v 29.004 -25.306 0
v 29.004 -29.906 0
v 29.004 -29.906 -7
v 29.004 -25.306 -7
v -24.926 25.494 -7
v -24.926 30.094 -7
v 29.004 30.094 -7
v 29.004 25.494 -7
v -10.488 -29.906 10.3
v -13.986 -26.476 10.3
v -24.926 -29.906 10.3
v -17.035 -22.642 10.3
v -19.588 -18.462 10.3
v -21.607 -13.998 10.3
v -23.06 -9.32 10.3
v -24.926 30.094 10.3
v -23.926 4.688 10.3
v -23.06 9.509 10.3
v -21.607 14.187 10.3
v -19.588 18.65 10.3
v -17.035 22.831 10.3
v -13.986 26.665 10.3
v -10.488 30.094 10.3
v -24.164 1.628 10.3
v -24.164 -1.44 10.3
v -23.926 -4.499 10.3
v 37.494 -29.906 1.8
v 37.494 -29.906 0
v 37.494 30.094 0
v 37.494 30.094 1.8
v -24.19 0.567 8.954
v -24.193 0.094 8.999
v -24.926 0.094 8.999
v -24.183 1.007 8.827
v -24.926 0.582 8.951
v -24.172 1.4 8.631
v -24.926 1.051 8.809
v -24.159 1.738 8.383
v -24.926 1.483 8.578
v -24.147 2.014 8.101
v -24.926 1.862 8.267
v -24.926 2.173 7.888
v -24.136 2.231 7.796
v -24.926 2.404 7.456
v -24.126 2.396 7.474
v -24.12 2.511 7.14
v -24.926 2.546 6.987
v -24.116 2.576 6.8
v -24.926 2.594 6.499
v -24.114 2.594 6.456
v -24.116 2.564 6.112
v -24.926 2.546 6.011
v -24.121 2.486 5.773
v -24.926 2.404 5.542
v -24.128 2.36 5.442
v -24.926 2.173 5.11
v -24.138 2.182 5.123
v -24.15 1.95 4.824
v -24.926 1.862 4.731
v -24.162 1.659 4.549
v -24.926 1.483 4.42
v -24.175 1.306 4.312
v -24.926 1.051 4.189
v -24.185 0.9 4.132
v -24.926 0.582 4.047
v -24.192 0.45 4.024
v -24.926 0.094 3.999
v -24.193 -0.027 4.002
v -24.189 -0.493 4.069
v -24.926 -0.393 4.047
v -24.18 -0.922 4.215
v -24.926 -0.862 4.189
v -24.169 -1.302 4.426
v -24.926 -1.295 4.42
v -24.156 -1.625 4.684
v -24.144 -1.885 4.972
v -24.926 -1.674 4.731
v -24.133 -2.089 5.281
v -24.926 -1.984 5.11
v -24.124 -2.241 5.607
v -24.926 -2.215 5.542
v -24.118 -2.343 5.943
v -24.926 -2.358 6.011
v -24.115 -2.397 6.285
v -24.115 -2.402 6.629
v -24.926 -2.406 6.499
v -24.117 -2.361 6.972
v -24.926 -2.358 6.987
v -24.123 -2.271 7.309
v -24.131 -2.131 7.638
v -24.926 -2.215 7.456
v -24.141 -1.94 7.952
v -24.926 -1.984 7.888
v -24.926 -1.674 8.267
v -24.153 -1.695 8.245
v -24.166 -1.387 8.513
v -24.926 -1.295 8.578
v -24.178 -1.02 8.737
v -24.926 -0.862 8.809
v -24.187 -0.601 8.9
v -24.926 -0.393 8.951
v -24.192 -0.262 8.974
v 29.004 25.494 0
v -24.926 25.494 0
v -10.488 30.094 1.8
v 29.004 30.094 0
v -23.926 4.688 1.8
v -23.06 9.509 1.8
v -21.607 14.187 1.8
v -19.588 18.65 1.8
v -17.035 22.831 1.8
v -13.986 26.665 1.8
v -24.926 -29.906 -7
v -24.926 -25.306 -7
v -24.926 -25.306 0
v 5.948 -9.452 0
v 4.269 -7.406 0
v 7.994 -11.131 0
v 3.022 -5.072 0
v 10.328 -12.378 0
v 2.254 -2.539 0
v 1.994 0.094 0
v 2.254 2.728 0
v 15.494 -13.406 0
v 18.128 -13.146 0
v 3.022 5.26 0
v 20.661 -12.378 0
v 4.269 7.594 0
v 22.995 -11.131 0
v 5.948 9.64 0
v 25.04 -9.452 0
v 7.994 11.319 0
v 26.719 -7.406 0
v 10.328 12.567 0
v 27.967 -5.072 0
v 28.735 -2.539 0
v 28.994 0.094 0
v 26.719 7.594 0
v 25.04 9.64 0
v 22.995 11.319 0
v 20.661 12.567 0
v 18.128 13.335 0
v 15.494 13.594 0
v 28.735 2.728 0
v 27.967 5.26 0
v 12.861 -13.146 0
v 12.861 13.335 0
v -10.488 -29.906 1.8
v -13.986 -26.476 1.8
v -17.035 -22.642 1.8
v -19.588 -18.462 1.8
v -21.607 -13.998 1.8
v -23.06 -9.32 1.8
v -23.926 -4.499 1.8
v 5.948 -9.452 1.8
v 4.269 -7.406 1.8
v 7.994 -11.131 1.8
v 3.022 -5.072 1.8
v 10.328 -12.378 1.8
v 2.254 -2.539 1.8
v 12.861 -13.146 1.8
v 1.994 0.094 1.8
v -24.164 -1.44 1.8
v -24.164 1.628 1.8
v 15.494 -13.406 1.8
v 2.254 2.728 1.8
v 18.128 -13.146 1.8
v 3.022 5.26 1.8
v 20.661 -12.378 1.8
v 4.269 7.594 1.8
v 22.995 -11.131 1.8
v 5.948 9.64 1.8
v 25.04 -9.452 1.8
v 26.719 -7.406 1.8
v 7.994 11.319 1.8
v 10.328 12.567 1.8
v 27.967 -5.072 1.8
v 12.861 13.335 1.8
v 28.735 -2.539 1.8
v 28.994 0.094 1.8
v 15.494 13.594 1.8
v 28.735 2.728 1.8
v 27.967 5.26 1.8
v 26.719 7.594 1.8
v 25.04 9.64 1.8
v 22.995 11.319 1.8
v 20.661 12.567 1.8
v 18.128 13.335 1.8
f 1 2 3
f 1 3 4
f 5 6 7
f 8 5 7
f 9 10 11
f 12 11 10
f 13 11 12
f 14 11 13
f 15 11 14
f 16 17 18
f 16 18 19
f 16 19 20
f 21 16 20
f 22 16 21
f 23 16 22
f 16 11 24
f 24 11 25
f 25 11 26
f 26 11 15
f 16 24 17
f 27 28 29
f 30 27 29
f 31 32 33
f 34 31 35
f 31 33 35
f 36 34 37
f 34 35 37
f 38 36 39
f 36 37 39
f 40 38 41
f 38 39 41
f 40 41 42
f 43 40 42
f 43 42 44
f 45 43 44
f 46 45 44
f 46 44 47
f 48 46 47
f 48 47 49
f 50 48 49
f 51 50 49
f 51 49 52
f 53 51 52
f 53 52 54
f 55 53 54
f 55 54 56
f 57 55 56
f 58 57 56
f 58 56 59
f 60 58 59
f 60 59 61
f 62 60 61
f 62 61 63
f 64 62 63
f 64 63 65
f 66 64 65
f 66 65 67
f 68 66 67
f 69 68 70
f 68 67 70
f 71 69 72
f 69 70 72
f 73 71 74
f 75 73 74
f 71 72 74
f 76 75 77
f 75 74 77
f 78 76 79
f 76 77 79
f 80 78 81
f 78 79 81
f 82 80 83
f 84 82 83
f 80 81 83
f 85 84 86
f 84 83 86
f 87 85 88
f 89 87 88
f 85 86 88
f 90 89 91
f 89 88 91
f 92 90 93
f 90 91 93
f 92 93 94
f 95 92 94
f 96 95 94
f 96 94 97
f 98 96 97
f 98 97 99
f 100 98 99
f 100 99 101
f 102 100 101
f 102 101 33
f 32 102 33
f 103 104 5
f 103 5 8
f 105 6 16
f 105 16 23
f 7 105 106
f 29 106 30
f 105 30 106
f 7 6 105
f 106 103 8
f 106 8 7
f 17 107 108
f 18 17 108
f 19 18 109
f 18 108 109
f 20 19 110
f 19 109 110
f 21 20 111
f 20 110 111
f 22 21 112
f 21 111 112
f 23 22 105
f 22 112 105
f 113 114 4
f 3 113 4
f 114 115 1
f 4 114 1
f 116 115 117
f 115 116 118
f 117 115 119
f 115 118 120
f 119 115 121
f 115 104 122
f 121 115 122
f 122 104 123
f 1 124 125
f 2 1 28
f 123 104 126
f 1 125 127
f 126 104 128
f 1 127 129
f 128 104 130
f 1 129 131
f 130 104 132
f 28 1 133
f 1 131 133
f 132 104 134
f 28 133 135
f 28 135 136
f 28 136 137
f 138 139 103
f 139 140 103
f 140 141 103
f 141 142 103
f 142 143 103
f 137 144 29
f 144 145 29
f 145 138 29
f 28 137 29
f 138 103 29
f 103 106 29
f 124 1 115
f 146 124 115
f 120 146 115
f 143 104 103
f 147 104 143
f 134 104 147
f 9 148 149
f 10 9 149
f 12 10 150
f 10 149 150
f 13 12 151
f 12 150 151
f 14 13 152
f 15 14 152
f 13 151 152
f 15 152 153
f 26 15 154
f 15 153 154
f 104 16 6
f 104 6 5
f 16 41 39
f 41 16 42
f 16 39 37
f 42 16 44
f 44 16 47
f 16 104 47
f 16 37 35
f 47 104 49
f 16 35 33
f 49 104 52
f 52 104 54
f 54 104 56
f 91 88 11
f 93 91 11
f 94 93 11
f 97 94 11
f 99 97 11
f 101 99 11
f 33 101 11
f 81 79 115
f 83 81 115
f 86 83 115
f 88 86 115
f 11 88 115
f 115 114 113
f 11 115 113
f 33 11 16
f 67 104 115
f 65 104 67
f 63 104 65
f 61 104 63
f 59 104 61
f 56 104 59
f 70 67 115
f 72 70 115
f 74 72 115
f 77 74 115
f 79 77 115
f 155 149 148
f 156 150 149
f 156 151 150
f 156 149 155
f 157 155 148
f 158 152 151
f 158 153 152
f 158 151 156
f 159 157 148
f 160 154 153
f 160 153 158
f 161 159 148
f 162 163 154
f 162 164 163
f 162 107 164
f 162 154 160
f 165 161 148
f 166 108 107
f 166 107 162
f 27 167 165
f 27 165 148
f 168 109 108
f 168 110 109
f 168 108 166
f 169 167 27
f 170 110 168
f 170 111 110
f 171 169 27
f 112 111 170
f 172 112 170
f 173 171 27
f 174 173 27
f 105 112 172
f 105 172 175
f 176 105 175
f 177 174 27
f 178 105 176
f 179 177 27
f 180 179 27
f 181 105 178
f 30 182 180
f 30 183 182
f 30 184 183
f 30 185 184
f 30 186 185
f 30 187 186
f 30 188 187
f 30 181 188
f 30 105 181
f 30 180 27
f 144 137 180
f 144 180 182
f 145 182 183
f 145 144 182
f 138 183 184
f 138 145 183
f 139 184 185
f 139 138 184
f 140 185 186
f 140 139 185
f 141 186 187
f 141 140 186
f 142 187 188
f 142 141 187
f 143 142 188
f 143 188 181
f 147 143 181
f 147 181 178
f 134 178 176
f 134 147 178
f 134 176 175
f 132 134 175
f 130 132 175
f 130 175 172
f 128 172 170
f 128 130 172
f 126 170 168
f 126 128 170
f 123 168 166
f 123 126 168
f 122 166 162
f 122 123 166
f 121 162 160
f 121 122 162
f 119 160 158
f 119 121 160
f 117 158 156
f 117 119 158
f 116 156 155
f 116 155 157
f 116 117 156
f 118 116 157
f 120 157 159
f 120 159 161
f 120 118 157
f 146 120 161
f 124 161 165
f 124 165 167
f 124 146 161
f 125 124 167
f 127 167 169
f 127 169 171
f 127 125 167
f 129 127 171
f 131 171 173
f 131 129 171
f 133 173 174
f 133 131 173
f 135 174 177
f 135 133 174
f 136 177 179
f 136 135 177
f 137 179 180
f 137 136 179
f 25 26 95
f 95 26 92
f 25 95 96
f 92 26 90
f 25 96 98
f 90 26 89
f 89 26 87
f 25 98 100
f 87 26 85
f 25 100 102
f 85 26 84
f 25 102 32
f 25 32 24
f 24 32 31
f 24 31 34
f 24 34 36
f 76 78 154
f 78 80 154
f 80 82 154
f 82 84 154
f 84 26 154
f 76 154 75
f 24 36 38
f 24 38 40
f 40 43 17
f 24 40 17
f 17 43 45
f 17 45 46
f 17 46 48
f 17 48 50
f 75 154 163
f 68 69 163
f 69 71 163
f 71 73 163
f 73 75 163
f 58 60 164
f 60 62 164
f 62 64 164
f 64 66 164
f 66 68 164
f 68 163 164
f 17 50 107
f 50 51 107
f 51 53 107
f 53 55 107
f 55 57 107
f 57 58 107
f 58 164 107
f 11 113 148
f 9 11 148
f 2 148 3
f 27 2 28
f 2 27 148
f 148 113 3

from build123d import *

# Parameters (mm, degrees)
SKETCH1_W               = 62.4208
SKETCH1_H               = 60
SKETCH1_R               = 13.5
BOSS_EXTRUDE1_DEPTH     = 1.8
BOSS_EXTRUDE2_START     = -1.8
SKETCH2_W               = 53.9308
SKETCH2_H               = 4.6
BOSS_EXTRUDE2_DEPTH     = 7
BOSS_EXTRUDE3_DEPTH     = 8.5
CUT_EXTRUDE1_REACH      = 72.058
CUT_EXTRUDE1_END_RADIUS = 39.6875
SKETCH4_R               = 2.5


with BuildPart() as part:
    # Sketch1 → Boss-Extrude1 (new body)
    with BuildSketch(Plane.XY):
        with Locations((6.283906244, 0.094262462)):
            Rectangle(SKETCH1_W, SKETCH1_H)
        with Locations((15.494306244, 0.094262462)):
            Circle(SKETCH1_R, mode=Mode.SUBTRACT)
    extrude(amount=BOSS_EXTRUDE1_DEPTH)

    # Sketch2 → Boss-Extrude2 (add)
    with BuildSketch(Plane.XY.offset(1.8).offset(BOSS_EXTRUDE2_START)):
        with Locations((2.038906244, -27.605737538)):
            Rectangle(SKETCH2_W, SKETCH2_H)
        with Locations((2.038906244, 27.794262462)):
            Rectangle(SKETCH2_W, SKETCH2_H)
    extrude(amount=-BOSS_EXTRUDE2_DEPTH)

    # Sketch3 → Boss-Extrude3 (add)
    with BuildSketch(Plane.XY.offset(1.8)):
        with BuildLine():
            ThreePointArc((-10.488335197, -29.905737538), (-19.588138729, -18.461591357), (-23.926493756, -4.49901345))
            ThreePointArc((-23.926493756, -4.49901345), (-24.193193756, 0.094262462), (-23.926493756, 4.687538375))
            ThreePointArc((-23.926493756, 4.687538375), (-19.588138729, 18.650116281), (-10.488335197, 30.094262462))
            Line((-10.488335197, 30.094262462), (-24.926493756, 30.094262462))
            Line((-24.926493756, 30.094262462), (-24.926493756, -29.905737538))
            Line((-24.926493756, -29.905737538), (-10.488335197, -29.905737538))
        make_face()
    extrude(amount=BOSS_EXTRUDE3_DEPTH)

    # Cut-Extrude1: up to this cylinder (the profile starts outside it)
    cut_extrude1_end = Plane(origin=(15.494306244, 0.094262462, 6.499), z_dir=(0, 0, -1)) * Cylinder(CUT_EXTRUDE1_END_RADIUS, 224.491, mode=Mode.PRIVATE)
    # Sketch4 → Cut-Extrude1 (cut, up to the surface)
    with BuildSketch(Plane.ZY.offset(24.926493756), mode=Mode.PRIVATE) as cut_extrude1_sk1:
        with Locations((6.499, 0.094262462)):
            Circle(SKETCH4_R)
    cut_extrude1_tool1 = extrude(cut_extrude1_sk1.sketch, amount=-CUT_EXTRUDE1_REACH, mode=Mode.PRIVATE) - cut_extrude1_end
    add(cut_extrude1_tool1.solids().sort_by_distance((-24.926494, 0.094262, 6.499))[0], mode=Mode.SUBTRACT)


solid = part.part
